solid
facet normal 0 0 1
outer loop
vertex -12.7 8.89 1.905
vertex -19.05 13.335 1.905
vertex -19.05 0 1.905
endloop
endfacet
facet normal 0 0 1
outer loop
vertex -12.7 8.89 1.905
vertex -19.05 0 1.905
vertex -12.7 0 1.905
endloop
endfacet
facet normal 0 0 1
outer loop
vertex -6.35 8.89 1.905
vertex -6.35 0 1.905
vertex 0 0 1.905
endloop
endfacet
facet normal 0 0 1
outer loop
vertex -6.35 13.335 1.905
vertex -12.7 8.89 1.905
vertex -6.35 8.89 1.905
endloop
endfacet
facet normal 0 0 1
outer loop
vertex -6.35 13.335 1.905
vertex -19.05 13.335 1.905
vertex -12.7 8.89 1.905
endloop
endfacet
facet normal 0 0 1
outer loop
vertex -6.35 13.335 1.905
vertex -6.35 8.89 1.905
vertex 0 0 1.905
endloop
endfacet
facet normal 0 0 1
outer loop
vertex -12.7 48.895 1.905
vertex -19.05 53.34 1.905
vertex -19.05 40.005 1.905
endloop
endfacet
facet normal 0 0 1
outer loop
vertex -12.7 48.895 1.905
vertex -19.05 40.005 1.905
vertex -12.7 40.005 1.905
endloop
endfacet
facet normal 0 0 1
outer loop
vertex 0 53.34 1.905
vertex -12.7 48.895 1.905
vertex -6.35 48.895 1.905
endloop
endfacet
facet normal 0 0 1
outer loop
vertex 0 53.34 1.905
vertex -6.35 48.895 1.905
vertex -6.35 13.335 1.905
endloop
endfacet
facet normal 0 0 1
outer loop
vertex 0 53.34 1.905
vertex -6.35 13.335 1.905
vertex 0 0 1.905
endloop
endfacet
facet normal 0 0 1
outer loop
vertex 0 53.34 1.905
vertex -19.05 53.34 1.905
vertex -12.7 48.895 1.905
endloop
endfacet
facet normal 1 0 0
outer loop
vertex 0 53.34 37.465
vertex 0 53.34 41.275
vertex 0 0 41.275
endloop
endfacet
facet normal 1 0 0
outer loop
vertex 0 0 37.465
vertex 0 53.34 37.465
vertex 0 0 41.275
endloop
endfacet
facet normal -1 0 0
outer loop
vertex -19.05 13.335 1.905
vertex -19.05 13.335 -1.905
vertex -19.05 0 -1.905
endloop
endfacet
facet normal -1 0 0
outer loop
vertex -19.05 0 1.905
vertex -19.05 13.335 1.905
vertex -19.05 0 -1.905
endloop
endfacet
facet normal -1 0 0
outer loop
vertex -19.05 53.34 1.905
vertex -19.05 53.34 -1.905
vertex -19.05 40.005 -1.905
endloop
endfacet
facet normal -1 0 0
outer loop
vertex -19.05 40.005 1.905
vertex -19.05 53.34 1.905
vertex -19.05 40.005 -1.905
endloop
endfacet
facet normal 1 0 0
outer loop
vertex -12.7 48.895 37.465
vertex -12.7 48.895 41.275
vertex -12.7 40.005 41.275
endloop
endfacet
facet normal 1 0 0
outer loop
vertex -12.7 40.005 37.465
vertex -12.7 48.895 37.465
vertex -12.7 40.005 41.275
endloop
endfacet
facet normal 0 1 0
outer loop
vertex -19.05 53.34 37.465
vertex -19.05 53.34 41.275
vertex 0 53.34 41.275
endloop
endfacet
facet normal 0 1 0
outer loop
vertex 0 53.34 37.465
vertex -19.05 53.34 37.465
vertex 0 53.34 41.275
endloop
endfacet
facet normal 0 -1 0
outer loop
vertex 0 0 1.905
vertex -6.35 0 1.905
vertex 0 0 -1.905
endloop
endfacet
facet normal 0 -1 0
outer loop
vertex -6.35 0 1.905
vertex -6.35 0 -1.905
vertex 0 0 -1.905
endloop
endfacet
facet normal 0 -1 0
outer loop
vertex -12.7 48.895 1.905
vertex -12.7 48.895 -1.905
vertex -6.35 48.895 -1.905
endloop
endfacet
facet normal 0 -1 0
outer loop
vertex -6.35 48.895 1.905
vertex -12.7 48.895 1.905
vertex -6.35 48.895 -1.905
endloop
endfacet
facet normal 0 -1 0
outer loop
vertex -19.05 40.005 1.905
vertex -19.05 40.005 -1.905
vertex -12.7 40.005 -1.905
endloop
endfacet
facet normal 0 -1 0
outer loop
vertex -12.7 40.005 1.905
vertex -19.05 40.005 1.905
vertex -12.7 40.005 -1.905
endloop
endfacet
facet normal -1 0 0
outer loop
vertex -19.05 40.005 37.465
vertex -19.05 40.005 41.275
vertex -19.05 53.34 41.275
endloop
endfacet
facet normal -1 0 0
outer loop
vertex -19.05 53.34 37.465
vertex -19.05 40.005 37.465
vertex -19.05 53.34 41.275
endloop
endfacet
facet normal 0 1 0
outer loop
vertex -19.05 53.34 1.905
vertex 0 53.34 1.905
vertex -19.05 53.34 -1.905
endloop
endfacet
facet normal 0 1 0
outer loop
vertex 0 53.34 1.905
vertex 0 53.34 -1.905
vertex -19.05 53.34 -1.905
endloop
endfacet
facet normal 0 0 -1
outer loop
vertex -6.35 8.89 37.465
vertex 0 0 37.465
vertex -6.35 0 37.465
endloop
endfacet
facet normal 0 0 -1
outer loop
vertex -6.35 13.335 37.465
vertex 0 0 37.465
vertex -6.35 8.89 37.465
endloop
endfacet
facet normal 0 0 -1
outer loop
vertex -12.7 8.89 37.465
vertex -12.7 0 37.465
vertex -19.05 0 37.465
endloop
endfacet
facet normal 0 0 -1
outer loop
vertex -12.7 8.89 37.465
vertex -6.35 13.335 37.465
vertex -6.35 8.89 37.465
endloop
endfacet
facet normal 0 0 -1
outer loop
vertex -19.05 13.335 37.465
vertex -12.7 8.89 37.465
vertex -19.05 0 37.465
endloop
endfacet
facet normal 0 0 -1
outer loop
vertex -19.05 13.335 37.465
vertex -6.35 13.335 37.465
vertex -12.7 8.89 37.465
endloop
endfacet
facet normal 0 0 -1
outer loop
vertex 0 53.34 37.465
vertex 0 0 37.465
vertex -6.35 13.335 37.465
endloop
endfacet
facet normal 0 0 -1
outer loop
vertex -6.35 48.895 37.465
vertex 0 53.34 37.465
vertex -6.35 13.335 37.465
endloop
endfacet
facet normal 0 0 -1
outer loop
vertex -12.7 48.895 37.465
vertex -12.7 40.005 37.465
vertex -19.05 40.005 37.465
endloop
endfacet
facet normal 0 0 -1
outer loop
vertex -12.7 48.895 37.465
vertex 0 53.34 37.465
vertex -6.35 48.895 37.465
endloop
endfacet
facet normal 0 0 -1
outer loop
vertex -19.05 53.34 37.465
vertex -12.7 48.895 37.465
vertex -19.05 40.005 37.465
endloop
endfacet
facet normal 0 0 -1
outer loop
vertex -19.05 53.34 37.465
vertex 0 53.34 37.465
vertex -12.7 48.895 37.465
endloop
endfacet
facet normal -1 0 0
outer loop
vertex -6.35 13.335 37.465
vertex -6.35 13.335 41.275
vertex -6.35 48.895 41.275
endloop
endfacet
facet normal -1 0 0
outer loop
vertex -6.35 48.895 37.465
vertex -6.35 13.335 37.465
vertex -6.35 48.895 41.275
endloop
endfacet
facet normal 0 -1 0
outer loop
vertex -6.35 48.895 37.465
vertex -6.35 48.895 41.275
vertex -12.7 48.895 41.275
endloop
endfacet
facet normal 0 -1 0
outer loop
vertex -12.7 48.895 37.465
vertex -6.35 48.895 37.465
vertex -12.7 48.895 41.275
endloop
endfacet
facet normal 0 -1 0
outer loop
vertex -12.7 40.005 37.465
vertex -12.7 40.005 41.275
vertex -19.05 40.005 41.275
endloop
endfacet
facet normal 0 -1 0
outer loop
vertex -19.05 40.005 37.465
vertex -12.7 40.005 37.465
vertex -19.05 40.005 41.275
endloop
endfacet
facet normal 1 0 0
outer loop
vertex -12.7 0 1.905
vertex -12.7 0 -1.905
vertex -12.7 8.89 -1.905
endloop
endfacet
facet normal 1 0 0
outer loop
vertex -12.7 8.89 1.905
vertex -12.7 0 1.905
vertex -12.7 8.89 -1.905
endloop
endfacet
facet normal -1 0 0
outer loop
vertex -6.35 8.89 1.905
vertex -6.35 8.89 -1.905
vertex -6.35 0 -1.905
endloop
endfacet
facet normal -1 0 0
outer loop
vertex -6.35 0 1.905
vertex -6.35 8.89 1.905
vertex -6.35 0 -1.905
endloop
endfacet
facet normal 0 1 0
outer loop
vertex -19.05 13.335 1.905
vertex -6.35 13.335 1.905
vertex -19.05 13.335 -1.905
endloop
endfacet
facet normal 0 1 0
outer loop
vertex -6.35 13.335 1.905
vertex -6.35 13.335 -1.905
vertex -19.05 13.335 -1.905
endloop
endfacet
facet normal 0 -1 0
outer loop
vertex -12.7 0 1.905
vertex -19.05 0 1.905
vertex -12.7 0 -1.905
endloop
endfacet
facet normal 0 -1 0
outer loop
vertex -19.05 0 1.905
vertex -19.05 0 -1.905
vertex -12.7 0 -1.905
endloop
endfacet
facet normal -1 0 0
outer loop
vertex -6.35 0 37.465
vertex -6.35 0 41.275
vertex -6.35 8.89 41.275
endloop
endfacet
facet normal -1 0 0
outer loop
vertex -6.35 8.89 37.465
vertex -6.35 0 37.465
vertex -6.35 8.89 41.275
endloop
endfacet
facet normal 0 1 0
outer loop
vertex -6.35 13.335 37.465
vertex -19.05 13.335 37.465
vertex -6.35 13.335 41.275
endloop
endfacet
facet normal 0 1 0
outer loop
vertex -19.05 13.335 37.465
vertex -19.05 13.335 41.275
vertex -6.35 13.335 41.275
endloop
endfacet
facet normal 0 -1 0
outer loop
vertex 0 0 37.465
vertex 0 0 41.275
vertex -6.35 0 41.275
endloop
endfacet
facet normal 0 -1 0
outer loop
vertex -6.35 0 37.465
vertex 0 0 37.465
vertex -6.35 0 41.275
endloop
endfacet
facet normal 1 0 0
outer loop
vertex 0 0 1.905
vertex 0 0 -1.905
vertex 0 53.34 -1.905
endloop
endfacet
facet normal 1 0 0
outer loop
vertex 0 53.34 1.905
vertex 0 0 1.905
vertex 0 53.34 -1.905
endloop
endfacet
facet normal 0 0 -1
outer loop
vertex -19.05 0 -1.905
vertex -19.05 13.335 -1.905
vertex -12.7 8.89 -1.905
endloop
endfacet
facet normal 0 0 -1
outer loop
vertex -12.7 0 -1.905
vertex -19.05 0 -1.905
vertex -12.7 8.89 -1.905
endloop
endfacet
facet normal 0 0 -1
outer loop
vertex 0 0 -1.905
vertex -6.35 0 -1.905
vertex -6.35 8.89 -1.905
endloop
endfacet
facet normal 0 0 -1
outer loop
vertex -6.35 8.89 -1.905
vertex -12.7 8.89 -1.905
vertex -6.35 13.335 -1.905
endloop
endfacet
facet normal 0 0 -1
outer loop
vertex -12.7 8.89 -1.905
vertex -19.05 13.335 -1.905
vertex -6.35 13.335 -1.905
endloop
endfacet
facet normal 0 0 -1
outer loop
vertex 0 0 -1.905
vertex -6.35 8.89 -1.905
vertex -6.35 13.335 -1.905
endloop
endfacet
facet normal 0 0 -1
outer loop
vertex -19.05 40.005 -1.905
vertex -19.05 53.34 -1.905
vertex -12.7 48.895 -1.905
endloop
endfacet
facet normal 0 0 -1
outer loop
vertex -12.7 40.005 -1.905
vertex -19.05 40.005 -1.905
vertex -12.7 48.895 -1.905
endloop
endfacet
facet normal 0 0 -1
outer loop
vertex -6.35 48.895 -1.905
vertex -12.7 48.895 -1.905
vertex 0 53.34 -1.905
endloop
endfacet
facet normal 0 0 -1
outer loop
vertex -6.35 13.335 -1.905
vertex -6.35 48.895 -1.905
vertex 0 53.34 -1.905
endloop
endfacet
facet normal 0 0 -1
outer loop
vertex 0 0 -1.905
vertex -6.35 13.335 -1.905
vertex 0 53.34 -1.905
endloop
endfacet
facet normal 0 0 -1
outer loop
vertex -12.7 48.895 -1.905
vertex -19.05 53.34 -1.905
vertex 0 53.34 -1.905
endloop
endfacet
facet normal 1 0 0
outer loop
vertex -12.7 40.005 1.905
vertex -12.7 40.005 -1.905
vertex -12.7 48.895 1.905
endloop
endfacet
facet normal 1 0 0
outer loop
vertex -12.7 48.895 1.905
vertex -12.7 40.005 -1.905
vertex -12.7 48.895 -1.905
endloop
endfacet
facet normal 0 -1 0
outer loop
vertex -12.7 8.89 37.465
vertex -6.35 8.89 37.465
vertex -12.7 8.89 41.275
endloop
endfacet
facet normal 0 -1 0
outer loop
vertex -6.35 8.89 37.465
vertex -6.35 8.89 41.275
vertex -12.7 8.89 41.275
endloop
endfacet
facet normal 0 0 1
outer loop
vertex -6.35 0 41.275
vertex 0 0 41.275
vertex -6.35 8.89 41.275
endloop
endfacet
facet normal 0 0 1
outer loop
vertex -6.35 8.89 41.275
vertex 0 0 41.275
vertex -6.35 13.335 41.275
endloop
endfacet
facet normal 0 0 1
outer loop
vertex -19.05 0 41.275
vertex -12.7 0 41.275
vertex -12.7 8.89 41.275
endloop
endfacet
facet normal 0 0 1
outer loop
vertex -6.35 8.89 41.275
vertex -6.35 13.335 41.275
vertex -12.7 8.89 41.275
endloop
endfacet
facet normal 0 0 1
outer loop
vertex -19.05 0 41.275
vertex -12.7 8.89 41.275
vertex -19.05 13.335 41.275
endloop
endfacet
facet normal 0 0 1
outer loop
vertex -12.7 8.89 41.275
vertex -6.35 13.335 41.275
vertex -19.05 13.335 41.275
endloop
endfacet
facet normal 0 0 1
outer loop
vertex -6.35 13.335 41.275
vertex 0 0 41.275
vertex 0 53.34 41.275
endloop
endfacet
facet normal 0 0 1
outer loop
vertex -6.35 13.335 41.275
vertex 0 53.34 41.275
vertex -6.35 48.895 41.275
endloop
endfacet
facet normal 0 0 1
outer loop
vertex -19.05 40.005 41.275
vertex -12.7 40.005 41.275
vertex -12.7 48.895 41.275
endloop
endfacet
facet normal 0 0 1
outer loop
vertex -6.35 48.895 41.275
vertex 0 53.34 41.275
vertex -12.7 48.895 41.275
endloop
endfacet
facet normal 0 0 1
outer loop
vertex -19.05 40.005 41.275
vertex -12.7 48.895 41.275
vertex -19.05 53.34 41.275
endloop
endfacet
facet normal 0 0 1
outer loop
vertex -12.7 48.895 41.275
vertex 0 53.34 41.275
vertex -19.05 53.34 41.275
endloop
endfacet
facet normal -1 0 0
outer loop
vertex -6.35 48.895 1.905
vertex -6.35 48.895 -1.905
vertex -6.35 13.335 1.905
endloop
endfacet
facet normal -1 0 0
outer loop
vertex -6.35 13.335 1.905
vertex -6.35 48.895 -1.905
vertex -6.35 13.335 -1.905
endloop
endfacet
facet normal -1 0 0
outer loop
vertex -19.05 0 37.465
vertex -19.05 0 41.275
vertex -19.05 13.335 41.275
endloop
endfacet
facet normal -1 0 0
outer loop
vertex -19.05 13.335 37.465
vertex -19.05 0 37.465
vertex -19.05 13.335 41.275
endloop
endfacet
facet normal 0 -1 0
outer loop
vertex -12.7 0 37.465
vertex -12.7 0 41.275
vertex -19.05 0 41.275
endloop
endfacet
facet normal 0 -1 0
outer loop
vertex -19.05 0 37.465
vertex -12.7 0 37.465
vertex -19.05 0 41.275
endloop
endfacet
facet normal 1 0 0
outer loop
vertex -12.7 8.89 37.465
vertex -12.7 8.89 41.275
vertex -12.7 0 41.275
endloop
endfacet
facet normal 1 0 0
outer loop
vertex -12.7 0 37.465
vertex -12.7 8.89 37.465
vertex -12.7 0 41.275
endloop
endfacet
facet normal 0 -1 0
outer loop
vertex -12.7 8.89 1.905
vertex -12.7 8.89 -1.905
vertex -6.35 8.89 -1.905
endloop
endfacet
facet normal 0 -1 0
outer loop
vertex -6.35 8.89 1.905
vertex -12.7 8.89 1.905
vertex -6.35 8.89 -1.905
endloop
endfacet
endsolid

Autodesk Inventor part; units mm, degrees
ref_plane "YZ Plane" through (0, 0, 0) normal (1, 0, 0) x (0, 1, 0)
ref_plane "XZ Plane" through (0, 0, 0) normal (0, 1, 0) x (-1, 0, 0)
sketch "Sketch1" plane through (0, 0, 0) normal (0, 0, 1) x (1, 0, 0)
  line L0 (0, 6.35) -> (0, 53.34)
  line L1 (0, 53.34) -> (-19.05, 53.34)
  line L2 (-19.05, 53.34) -> (-19.05, 55.245)
  line L3 (-12.7, 48.895) -> (-6.35, 48.895)
  line L4 (-6.35, 48.895) -> (-6.35, 13.335)
  line L5 (-6.35, 13.335) -> (-19.05, 13.335)
  line L6 (-19.05, 13.335) -> (-19.05, 12.7)
  line L7 (-12.7, 8.89) -> (-6.35, 8.89)
  line L8 (-6.35, 8.89) -> (-6.35, 0)
  line L9 (-6.35, 0) -> (0, 0)
  line L10 (-19.05, 55.245) -> (-19.05, 40.005)
  line L11 (-19.05, 40.005) -> (-12.7, 40.005)
  line L12 (-12.7, 40.005) -> (-12.7, 48.895)
  line L13 (-19.05, 12.7) -> (-19.05, 0)
  line L14 (-19.05, 0) -> (-12.7, 0)
  line L15 (-12.7, 0) -> (-12.7, 8.89)
  line L16 (0, 0) -> (0, 6.35)
  point P0 (-19.05, 53.34)
  point P1 (-19.05, 11.43)
  dimension "d1" = 35.56
  dimension "d2" = 4.445
  dimension "d3" = 4.445
  dimension "d4" = 6.35
  dimension "d6" = 6.35
  dimension "d7" = 6.35
  dimension "d13" = 13.335
  dimension "d14" = 13.335
extrude "Extrusion1" add sketch "Sketch1" along normal mid plane 3.81
ref_plane "Work Plane1" through (0, 0, 19.685) normal (0, 0, 1) x (1, 0, 0)
mirror "Mirror1" about plane through (0, 0, 19.685) normal (0, 0, 1) of "Extrusion1"
equation "\"d11\" = width"
equation "\"d15\" = oneHalfSpacing"
equation "\"width\" = 3.81"
equation "\"spacing\" = 39.37"
equation "\"oneHalfSpacing\" = 0.5 * spacing"
properties part number "twostartConfigurationV01"
